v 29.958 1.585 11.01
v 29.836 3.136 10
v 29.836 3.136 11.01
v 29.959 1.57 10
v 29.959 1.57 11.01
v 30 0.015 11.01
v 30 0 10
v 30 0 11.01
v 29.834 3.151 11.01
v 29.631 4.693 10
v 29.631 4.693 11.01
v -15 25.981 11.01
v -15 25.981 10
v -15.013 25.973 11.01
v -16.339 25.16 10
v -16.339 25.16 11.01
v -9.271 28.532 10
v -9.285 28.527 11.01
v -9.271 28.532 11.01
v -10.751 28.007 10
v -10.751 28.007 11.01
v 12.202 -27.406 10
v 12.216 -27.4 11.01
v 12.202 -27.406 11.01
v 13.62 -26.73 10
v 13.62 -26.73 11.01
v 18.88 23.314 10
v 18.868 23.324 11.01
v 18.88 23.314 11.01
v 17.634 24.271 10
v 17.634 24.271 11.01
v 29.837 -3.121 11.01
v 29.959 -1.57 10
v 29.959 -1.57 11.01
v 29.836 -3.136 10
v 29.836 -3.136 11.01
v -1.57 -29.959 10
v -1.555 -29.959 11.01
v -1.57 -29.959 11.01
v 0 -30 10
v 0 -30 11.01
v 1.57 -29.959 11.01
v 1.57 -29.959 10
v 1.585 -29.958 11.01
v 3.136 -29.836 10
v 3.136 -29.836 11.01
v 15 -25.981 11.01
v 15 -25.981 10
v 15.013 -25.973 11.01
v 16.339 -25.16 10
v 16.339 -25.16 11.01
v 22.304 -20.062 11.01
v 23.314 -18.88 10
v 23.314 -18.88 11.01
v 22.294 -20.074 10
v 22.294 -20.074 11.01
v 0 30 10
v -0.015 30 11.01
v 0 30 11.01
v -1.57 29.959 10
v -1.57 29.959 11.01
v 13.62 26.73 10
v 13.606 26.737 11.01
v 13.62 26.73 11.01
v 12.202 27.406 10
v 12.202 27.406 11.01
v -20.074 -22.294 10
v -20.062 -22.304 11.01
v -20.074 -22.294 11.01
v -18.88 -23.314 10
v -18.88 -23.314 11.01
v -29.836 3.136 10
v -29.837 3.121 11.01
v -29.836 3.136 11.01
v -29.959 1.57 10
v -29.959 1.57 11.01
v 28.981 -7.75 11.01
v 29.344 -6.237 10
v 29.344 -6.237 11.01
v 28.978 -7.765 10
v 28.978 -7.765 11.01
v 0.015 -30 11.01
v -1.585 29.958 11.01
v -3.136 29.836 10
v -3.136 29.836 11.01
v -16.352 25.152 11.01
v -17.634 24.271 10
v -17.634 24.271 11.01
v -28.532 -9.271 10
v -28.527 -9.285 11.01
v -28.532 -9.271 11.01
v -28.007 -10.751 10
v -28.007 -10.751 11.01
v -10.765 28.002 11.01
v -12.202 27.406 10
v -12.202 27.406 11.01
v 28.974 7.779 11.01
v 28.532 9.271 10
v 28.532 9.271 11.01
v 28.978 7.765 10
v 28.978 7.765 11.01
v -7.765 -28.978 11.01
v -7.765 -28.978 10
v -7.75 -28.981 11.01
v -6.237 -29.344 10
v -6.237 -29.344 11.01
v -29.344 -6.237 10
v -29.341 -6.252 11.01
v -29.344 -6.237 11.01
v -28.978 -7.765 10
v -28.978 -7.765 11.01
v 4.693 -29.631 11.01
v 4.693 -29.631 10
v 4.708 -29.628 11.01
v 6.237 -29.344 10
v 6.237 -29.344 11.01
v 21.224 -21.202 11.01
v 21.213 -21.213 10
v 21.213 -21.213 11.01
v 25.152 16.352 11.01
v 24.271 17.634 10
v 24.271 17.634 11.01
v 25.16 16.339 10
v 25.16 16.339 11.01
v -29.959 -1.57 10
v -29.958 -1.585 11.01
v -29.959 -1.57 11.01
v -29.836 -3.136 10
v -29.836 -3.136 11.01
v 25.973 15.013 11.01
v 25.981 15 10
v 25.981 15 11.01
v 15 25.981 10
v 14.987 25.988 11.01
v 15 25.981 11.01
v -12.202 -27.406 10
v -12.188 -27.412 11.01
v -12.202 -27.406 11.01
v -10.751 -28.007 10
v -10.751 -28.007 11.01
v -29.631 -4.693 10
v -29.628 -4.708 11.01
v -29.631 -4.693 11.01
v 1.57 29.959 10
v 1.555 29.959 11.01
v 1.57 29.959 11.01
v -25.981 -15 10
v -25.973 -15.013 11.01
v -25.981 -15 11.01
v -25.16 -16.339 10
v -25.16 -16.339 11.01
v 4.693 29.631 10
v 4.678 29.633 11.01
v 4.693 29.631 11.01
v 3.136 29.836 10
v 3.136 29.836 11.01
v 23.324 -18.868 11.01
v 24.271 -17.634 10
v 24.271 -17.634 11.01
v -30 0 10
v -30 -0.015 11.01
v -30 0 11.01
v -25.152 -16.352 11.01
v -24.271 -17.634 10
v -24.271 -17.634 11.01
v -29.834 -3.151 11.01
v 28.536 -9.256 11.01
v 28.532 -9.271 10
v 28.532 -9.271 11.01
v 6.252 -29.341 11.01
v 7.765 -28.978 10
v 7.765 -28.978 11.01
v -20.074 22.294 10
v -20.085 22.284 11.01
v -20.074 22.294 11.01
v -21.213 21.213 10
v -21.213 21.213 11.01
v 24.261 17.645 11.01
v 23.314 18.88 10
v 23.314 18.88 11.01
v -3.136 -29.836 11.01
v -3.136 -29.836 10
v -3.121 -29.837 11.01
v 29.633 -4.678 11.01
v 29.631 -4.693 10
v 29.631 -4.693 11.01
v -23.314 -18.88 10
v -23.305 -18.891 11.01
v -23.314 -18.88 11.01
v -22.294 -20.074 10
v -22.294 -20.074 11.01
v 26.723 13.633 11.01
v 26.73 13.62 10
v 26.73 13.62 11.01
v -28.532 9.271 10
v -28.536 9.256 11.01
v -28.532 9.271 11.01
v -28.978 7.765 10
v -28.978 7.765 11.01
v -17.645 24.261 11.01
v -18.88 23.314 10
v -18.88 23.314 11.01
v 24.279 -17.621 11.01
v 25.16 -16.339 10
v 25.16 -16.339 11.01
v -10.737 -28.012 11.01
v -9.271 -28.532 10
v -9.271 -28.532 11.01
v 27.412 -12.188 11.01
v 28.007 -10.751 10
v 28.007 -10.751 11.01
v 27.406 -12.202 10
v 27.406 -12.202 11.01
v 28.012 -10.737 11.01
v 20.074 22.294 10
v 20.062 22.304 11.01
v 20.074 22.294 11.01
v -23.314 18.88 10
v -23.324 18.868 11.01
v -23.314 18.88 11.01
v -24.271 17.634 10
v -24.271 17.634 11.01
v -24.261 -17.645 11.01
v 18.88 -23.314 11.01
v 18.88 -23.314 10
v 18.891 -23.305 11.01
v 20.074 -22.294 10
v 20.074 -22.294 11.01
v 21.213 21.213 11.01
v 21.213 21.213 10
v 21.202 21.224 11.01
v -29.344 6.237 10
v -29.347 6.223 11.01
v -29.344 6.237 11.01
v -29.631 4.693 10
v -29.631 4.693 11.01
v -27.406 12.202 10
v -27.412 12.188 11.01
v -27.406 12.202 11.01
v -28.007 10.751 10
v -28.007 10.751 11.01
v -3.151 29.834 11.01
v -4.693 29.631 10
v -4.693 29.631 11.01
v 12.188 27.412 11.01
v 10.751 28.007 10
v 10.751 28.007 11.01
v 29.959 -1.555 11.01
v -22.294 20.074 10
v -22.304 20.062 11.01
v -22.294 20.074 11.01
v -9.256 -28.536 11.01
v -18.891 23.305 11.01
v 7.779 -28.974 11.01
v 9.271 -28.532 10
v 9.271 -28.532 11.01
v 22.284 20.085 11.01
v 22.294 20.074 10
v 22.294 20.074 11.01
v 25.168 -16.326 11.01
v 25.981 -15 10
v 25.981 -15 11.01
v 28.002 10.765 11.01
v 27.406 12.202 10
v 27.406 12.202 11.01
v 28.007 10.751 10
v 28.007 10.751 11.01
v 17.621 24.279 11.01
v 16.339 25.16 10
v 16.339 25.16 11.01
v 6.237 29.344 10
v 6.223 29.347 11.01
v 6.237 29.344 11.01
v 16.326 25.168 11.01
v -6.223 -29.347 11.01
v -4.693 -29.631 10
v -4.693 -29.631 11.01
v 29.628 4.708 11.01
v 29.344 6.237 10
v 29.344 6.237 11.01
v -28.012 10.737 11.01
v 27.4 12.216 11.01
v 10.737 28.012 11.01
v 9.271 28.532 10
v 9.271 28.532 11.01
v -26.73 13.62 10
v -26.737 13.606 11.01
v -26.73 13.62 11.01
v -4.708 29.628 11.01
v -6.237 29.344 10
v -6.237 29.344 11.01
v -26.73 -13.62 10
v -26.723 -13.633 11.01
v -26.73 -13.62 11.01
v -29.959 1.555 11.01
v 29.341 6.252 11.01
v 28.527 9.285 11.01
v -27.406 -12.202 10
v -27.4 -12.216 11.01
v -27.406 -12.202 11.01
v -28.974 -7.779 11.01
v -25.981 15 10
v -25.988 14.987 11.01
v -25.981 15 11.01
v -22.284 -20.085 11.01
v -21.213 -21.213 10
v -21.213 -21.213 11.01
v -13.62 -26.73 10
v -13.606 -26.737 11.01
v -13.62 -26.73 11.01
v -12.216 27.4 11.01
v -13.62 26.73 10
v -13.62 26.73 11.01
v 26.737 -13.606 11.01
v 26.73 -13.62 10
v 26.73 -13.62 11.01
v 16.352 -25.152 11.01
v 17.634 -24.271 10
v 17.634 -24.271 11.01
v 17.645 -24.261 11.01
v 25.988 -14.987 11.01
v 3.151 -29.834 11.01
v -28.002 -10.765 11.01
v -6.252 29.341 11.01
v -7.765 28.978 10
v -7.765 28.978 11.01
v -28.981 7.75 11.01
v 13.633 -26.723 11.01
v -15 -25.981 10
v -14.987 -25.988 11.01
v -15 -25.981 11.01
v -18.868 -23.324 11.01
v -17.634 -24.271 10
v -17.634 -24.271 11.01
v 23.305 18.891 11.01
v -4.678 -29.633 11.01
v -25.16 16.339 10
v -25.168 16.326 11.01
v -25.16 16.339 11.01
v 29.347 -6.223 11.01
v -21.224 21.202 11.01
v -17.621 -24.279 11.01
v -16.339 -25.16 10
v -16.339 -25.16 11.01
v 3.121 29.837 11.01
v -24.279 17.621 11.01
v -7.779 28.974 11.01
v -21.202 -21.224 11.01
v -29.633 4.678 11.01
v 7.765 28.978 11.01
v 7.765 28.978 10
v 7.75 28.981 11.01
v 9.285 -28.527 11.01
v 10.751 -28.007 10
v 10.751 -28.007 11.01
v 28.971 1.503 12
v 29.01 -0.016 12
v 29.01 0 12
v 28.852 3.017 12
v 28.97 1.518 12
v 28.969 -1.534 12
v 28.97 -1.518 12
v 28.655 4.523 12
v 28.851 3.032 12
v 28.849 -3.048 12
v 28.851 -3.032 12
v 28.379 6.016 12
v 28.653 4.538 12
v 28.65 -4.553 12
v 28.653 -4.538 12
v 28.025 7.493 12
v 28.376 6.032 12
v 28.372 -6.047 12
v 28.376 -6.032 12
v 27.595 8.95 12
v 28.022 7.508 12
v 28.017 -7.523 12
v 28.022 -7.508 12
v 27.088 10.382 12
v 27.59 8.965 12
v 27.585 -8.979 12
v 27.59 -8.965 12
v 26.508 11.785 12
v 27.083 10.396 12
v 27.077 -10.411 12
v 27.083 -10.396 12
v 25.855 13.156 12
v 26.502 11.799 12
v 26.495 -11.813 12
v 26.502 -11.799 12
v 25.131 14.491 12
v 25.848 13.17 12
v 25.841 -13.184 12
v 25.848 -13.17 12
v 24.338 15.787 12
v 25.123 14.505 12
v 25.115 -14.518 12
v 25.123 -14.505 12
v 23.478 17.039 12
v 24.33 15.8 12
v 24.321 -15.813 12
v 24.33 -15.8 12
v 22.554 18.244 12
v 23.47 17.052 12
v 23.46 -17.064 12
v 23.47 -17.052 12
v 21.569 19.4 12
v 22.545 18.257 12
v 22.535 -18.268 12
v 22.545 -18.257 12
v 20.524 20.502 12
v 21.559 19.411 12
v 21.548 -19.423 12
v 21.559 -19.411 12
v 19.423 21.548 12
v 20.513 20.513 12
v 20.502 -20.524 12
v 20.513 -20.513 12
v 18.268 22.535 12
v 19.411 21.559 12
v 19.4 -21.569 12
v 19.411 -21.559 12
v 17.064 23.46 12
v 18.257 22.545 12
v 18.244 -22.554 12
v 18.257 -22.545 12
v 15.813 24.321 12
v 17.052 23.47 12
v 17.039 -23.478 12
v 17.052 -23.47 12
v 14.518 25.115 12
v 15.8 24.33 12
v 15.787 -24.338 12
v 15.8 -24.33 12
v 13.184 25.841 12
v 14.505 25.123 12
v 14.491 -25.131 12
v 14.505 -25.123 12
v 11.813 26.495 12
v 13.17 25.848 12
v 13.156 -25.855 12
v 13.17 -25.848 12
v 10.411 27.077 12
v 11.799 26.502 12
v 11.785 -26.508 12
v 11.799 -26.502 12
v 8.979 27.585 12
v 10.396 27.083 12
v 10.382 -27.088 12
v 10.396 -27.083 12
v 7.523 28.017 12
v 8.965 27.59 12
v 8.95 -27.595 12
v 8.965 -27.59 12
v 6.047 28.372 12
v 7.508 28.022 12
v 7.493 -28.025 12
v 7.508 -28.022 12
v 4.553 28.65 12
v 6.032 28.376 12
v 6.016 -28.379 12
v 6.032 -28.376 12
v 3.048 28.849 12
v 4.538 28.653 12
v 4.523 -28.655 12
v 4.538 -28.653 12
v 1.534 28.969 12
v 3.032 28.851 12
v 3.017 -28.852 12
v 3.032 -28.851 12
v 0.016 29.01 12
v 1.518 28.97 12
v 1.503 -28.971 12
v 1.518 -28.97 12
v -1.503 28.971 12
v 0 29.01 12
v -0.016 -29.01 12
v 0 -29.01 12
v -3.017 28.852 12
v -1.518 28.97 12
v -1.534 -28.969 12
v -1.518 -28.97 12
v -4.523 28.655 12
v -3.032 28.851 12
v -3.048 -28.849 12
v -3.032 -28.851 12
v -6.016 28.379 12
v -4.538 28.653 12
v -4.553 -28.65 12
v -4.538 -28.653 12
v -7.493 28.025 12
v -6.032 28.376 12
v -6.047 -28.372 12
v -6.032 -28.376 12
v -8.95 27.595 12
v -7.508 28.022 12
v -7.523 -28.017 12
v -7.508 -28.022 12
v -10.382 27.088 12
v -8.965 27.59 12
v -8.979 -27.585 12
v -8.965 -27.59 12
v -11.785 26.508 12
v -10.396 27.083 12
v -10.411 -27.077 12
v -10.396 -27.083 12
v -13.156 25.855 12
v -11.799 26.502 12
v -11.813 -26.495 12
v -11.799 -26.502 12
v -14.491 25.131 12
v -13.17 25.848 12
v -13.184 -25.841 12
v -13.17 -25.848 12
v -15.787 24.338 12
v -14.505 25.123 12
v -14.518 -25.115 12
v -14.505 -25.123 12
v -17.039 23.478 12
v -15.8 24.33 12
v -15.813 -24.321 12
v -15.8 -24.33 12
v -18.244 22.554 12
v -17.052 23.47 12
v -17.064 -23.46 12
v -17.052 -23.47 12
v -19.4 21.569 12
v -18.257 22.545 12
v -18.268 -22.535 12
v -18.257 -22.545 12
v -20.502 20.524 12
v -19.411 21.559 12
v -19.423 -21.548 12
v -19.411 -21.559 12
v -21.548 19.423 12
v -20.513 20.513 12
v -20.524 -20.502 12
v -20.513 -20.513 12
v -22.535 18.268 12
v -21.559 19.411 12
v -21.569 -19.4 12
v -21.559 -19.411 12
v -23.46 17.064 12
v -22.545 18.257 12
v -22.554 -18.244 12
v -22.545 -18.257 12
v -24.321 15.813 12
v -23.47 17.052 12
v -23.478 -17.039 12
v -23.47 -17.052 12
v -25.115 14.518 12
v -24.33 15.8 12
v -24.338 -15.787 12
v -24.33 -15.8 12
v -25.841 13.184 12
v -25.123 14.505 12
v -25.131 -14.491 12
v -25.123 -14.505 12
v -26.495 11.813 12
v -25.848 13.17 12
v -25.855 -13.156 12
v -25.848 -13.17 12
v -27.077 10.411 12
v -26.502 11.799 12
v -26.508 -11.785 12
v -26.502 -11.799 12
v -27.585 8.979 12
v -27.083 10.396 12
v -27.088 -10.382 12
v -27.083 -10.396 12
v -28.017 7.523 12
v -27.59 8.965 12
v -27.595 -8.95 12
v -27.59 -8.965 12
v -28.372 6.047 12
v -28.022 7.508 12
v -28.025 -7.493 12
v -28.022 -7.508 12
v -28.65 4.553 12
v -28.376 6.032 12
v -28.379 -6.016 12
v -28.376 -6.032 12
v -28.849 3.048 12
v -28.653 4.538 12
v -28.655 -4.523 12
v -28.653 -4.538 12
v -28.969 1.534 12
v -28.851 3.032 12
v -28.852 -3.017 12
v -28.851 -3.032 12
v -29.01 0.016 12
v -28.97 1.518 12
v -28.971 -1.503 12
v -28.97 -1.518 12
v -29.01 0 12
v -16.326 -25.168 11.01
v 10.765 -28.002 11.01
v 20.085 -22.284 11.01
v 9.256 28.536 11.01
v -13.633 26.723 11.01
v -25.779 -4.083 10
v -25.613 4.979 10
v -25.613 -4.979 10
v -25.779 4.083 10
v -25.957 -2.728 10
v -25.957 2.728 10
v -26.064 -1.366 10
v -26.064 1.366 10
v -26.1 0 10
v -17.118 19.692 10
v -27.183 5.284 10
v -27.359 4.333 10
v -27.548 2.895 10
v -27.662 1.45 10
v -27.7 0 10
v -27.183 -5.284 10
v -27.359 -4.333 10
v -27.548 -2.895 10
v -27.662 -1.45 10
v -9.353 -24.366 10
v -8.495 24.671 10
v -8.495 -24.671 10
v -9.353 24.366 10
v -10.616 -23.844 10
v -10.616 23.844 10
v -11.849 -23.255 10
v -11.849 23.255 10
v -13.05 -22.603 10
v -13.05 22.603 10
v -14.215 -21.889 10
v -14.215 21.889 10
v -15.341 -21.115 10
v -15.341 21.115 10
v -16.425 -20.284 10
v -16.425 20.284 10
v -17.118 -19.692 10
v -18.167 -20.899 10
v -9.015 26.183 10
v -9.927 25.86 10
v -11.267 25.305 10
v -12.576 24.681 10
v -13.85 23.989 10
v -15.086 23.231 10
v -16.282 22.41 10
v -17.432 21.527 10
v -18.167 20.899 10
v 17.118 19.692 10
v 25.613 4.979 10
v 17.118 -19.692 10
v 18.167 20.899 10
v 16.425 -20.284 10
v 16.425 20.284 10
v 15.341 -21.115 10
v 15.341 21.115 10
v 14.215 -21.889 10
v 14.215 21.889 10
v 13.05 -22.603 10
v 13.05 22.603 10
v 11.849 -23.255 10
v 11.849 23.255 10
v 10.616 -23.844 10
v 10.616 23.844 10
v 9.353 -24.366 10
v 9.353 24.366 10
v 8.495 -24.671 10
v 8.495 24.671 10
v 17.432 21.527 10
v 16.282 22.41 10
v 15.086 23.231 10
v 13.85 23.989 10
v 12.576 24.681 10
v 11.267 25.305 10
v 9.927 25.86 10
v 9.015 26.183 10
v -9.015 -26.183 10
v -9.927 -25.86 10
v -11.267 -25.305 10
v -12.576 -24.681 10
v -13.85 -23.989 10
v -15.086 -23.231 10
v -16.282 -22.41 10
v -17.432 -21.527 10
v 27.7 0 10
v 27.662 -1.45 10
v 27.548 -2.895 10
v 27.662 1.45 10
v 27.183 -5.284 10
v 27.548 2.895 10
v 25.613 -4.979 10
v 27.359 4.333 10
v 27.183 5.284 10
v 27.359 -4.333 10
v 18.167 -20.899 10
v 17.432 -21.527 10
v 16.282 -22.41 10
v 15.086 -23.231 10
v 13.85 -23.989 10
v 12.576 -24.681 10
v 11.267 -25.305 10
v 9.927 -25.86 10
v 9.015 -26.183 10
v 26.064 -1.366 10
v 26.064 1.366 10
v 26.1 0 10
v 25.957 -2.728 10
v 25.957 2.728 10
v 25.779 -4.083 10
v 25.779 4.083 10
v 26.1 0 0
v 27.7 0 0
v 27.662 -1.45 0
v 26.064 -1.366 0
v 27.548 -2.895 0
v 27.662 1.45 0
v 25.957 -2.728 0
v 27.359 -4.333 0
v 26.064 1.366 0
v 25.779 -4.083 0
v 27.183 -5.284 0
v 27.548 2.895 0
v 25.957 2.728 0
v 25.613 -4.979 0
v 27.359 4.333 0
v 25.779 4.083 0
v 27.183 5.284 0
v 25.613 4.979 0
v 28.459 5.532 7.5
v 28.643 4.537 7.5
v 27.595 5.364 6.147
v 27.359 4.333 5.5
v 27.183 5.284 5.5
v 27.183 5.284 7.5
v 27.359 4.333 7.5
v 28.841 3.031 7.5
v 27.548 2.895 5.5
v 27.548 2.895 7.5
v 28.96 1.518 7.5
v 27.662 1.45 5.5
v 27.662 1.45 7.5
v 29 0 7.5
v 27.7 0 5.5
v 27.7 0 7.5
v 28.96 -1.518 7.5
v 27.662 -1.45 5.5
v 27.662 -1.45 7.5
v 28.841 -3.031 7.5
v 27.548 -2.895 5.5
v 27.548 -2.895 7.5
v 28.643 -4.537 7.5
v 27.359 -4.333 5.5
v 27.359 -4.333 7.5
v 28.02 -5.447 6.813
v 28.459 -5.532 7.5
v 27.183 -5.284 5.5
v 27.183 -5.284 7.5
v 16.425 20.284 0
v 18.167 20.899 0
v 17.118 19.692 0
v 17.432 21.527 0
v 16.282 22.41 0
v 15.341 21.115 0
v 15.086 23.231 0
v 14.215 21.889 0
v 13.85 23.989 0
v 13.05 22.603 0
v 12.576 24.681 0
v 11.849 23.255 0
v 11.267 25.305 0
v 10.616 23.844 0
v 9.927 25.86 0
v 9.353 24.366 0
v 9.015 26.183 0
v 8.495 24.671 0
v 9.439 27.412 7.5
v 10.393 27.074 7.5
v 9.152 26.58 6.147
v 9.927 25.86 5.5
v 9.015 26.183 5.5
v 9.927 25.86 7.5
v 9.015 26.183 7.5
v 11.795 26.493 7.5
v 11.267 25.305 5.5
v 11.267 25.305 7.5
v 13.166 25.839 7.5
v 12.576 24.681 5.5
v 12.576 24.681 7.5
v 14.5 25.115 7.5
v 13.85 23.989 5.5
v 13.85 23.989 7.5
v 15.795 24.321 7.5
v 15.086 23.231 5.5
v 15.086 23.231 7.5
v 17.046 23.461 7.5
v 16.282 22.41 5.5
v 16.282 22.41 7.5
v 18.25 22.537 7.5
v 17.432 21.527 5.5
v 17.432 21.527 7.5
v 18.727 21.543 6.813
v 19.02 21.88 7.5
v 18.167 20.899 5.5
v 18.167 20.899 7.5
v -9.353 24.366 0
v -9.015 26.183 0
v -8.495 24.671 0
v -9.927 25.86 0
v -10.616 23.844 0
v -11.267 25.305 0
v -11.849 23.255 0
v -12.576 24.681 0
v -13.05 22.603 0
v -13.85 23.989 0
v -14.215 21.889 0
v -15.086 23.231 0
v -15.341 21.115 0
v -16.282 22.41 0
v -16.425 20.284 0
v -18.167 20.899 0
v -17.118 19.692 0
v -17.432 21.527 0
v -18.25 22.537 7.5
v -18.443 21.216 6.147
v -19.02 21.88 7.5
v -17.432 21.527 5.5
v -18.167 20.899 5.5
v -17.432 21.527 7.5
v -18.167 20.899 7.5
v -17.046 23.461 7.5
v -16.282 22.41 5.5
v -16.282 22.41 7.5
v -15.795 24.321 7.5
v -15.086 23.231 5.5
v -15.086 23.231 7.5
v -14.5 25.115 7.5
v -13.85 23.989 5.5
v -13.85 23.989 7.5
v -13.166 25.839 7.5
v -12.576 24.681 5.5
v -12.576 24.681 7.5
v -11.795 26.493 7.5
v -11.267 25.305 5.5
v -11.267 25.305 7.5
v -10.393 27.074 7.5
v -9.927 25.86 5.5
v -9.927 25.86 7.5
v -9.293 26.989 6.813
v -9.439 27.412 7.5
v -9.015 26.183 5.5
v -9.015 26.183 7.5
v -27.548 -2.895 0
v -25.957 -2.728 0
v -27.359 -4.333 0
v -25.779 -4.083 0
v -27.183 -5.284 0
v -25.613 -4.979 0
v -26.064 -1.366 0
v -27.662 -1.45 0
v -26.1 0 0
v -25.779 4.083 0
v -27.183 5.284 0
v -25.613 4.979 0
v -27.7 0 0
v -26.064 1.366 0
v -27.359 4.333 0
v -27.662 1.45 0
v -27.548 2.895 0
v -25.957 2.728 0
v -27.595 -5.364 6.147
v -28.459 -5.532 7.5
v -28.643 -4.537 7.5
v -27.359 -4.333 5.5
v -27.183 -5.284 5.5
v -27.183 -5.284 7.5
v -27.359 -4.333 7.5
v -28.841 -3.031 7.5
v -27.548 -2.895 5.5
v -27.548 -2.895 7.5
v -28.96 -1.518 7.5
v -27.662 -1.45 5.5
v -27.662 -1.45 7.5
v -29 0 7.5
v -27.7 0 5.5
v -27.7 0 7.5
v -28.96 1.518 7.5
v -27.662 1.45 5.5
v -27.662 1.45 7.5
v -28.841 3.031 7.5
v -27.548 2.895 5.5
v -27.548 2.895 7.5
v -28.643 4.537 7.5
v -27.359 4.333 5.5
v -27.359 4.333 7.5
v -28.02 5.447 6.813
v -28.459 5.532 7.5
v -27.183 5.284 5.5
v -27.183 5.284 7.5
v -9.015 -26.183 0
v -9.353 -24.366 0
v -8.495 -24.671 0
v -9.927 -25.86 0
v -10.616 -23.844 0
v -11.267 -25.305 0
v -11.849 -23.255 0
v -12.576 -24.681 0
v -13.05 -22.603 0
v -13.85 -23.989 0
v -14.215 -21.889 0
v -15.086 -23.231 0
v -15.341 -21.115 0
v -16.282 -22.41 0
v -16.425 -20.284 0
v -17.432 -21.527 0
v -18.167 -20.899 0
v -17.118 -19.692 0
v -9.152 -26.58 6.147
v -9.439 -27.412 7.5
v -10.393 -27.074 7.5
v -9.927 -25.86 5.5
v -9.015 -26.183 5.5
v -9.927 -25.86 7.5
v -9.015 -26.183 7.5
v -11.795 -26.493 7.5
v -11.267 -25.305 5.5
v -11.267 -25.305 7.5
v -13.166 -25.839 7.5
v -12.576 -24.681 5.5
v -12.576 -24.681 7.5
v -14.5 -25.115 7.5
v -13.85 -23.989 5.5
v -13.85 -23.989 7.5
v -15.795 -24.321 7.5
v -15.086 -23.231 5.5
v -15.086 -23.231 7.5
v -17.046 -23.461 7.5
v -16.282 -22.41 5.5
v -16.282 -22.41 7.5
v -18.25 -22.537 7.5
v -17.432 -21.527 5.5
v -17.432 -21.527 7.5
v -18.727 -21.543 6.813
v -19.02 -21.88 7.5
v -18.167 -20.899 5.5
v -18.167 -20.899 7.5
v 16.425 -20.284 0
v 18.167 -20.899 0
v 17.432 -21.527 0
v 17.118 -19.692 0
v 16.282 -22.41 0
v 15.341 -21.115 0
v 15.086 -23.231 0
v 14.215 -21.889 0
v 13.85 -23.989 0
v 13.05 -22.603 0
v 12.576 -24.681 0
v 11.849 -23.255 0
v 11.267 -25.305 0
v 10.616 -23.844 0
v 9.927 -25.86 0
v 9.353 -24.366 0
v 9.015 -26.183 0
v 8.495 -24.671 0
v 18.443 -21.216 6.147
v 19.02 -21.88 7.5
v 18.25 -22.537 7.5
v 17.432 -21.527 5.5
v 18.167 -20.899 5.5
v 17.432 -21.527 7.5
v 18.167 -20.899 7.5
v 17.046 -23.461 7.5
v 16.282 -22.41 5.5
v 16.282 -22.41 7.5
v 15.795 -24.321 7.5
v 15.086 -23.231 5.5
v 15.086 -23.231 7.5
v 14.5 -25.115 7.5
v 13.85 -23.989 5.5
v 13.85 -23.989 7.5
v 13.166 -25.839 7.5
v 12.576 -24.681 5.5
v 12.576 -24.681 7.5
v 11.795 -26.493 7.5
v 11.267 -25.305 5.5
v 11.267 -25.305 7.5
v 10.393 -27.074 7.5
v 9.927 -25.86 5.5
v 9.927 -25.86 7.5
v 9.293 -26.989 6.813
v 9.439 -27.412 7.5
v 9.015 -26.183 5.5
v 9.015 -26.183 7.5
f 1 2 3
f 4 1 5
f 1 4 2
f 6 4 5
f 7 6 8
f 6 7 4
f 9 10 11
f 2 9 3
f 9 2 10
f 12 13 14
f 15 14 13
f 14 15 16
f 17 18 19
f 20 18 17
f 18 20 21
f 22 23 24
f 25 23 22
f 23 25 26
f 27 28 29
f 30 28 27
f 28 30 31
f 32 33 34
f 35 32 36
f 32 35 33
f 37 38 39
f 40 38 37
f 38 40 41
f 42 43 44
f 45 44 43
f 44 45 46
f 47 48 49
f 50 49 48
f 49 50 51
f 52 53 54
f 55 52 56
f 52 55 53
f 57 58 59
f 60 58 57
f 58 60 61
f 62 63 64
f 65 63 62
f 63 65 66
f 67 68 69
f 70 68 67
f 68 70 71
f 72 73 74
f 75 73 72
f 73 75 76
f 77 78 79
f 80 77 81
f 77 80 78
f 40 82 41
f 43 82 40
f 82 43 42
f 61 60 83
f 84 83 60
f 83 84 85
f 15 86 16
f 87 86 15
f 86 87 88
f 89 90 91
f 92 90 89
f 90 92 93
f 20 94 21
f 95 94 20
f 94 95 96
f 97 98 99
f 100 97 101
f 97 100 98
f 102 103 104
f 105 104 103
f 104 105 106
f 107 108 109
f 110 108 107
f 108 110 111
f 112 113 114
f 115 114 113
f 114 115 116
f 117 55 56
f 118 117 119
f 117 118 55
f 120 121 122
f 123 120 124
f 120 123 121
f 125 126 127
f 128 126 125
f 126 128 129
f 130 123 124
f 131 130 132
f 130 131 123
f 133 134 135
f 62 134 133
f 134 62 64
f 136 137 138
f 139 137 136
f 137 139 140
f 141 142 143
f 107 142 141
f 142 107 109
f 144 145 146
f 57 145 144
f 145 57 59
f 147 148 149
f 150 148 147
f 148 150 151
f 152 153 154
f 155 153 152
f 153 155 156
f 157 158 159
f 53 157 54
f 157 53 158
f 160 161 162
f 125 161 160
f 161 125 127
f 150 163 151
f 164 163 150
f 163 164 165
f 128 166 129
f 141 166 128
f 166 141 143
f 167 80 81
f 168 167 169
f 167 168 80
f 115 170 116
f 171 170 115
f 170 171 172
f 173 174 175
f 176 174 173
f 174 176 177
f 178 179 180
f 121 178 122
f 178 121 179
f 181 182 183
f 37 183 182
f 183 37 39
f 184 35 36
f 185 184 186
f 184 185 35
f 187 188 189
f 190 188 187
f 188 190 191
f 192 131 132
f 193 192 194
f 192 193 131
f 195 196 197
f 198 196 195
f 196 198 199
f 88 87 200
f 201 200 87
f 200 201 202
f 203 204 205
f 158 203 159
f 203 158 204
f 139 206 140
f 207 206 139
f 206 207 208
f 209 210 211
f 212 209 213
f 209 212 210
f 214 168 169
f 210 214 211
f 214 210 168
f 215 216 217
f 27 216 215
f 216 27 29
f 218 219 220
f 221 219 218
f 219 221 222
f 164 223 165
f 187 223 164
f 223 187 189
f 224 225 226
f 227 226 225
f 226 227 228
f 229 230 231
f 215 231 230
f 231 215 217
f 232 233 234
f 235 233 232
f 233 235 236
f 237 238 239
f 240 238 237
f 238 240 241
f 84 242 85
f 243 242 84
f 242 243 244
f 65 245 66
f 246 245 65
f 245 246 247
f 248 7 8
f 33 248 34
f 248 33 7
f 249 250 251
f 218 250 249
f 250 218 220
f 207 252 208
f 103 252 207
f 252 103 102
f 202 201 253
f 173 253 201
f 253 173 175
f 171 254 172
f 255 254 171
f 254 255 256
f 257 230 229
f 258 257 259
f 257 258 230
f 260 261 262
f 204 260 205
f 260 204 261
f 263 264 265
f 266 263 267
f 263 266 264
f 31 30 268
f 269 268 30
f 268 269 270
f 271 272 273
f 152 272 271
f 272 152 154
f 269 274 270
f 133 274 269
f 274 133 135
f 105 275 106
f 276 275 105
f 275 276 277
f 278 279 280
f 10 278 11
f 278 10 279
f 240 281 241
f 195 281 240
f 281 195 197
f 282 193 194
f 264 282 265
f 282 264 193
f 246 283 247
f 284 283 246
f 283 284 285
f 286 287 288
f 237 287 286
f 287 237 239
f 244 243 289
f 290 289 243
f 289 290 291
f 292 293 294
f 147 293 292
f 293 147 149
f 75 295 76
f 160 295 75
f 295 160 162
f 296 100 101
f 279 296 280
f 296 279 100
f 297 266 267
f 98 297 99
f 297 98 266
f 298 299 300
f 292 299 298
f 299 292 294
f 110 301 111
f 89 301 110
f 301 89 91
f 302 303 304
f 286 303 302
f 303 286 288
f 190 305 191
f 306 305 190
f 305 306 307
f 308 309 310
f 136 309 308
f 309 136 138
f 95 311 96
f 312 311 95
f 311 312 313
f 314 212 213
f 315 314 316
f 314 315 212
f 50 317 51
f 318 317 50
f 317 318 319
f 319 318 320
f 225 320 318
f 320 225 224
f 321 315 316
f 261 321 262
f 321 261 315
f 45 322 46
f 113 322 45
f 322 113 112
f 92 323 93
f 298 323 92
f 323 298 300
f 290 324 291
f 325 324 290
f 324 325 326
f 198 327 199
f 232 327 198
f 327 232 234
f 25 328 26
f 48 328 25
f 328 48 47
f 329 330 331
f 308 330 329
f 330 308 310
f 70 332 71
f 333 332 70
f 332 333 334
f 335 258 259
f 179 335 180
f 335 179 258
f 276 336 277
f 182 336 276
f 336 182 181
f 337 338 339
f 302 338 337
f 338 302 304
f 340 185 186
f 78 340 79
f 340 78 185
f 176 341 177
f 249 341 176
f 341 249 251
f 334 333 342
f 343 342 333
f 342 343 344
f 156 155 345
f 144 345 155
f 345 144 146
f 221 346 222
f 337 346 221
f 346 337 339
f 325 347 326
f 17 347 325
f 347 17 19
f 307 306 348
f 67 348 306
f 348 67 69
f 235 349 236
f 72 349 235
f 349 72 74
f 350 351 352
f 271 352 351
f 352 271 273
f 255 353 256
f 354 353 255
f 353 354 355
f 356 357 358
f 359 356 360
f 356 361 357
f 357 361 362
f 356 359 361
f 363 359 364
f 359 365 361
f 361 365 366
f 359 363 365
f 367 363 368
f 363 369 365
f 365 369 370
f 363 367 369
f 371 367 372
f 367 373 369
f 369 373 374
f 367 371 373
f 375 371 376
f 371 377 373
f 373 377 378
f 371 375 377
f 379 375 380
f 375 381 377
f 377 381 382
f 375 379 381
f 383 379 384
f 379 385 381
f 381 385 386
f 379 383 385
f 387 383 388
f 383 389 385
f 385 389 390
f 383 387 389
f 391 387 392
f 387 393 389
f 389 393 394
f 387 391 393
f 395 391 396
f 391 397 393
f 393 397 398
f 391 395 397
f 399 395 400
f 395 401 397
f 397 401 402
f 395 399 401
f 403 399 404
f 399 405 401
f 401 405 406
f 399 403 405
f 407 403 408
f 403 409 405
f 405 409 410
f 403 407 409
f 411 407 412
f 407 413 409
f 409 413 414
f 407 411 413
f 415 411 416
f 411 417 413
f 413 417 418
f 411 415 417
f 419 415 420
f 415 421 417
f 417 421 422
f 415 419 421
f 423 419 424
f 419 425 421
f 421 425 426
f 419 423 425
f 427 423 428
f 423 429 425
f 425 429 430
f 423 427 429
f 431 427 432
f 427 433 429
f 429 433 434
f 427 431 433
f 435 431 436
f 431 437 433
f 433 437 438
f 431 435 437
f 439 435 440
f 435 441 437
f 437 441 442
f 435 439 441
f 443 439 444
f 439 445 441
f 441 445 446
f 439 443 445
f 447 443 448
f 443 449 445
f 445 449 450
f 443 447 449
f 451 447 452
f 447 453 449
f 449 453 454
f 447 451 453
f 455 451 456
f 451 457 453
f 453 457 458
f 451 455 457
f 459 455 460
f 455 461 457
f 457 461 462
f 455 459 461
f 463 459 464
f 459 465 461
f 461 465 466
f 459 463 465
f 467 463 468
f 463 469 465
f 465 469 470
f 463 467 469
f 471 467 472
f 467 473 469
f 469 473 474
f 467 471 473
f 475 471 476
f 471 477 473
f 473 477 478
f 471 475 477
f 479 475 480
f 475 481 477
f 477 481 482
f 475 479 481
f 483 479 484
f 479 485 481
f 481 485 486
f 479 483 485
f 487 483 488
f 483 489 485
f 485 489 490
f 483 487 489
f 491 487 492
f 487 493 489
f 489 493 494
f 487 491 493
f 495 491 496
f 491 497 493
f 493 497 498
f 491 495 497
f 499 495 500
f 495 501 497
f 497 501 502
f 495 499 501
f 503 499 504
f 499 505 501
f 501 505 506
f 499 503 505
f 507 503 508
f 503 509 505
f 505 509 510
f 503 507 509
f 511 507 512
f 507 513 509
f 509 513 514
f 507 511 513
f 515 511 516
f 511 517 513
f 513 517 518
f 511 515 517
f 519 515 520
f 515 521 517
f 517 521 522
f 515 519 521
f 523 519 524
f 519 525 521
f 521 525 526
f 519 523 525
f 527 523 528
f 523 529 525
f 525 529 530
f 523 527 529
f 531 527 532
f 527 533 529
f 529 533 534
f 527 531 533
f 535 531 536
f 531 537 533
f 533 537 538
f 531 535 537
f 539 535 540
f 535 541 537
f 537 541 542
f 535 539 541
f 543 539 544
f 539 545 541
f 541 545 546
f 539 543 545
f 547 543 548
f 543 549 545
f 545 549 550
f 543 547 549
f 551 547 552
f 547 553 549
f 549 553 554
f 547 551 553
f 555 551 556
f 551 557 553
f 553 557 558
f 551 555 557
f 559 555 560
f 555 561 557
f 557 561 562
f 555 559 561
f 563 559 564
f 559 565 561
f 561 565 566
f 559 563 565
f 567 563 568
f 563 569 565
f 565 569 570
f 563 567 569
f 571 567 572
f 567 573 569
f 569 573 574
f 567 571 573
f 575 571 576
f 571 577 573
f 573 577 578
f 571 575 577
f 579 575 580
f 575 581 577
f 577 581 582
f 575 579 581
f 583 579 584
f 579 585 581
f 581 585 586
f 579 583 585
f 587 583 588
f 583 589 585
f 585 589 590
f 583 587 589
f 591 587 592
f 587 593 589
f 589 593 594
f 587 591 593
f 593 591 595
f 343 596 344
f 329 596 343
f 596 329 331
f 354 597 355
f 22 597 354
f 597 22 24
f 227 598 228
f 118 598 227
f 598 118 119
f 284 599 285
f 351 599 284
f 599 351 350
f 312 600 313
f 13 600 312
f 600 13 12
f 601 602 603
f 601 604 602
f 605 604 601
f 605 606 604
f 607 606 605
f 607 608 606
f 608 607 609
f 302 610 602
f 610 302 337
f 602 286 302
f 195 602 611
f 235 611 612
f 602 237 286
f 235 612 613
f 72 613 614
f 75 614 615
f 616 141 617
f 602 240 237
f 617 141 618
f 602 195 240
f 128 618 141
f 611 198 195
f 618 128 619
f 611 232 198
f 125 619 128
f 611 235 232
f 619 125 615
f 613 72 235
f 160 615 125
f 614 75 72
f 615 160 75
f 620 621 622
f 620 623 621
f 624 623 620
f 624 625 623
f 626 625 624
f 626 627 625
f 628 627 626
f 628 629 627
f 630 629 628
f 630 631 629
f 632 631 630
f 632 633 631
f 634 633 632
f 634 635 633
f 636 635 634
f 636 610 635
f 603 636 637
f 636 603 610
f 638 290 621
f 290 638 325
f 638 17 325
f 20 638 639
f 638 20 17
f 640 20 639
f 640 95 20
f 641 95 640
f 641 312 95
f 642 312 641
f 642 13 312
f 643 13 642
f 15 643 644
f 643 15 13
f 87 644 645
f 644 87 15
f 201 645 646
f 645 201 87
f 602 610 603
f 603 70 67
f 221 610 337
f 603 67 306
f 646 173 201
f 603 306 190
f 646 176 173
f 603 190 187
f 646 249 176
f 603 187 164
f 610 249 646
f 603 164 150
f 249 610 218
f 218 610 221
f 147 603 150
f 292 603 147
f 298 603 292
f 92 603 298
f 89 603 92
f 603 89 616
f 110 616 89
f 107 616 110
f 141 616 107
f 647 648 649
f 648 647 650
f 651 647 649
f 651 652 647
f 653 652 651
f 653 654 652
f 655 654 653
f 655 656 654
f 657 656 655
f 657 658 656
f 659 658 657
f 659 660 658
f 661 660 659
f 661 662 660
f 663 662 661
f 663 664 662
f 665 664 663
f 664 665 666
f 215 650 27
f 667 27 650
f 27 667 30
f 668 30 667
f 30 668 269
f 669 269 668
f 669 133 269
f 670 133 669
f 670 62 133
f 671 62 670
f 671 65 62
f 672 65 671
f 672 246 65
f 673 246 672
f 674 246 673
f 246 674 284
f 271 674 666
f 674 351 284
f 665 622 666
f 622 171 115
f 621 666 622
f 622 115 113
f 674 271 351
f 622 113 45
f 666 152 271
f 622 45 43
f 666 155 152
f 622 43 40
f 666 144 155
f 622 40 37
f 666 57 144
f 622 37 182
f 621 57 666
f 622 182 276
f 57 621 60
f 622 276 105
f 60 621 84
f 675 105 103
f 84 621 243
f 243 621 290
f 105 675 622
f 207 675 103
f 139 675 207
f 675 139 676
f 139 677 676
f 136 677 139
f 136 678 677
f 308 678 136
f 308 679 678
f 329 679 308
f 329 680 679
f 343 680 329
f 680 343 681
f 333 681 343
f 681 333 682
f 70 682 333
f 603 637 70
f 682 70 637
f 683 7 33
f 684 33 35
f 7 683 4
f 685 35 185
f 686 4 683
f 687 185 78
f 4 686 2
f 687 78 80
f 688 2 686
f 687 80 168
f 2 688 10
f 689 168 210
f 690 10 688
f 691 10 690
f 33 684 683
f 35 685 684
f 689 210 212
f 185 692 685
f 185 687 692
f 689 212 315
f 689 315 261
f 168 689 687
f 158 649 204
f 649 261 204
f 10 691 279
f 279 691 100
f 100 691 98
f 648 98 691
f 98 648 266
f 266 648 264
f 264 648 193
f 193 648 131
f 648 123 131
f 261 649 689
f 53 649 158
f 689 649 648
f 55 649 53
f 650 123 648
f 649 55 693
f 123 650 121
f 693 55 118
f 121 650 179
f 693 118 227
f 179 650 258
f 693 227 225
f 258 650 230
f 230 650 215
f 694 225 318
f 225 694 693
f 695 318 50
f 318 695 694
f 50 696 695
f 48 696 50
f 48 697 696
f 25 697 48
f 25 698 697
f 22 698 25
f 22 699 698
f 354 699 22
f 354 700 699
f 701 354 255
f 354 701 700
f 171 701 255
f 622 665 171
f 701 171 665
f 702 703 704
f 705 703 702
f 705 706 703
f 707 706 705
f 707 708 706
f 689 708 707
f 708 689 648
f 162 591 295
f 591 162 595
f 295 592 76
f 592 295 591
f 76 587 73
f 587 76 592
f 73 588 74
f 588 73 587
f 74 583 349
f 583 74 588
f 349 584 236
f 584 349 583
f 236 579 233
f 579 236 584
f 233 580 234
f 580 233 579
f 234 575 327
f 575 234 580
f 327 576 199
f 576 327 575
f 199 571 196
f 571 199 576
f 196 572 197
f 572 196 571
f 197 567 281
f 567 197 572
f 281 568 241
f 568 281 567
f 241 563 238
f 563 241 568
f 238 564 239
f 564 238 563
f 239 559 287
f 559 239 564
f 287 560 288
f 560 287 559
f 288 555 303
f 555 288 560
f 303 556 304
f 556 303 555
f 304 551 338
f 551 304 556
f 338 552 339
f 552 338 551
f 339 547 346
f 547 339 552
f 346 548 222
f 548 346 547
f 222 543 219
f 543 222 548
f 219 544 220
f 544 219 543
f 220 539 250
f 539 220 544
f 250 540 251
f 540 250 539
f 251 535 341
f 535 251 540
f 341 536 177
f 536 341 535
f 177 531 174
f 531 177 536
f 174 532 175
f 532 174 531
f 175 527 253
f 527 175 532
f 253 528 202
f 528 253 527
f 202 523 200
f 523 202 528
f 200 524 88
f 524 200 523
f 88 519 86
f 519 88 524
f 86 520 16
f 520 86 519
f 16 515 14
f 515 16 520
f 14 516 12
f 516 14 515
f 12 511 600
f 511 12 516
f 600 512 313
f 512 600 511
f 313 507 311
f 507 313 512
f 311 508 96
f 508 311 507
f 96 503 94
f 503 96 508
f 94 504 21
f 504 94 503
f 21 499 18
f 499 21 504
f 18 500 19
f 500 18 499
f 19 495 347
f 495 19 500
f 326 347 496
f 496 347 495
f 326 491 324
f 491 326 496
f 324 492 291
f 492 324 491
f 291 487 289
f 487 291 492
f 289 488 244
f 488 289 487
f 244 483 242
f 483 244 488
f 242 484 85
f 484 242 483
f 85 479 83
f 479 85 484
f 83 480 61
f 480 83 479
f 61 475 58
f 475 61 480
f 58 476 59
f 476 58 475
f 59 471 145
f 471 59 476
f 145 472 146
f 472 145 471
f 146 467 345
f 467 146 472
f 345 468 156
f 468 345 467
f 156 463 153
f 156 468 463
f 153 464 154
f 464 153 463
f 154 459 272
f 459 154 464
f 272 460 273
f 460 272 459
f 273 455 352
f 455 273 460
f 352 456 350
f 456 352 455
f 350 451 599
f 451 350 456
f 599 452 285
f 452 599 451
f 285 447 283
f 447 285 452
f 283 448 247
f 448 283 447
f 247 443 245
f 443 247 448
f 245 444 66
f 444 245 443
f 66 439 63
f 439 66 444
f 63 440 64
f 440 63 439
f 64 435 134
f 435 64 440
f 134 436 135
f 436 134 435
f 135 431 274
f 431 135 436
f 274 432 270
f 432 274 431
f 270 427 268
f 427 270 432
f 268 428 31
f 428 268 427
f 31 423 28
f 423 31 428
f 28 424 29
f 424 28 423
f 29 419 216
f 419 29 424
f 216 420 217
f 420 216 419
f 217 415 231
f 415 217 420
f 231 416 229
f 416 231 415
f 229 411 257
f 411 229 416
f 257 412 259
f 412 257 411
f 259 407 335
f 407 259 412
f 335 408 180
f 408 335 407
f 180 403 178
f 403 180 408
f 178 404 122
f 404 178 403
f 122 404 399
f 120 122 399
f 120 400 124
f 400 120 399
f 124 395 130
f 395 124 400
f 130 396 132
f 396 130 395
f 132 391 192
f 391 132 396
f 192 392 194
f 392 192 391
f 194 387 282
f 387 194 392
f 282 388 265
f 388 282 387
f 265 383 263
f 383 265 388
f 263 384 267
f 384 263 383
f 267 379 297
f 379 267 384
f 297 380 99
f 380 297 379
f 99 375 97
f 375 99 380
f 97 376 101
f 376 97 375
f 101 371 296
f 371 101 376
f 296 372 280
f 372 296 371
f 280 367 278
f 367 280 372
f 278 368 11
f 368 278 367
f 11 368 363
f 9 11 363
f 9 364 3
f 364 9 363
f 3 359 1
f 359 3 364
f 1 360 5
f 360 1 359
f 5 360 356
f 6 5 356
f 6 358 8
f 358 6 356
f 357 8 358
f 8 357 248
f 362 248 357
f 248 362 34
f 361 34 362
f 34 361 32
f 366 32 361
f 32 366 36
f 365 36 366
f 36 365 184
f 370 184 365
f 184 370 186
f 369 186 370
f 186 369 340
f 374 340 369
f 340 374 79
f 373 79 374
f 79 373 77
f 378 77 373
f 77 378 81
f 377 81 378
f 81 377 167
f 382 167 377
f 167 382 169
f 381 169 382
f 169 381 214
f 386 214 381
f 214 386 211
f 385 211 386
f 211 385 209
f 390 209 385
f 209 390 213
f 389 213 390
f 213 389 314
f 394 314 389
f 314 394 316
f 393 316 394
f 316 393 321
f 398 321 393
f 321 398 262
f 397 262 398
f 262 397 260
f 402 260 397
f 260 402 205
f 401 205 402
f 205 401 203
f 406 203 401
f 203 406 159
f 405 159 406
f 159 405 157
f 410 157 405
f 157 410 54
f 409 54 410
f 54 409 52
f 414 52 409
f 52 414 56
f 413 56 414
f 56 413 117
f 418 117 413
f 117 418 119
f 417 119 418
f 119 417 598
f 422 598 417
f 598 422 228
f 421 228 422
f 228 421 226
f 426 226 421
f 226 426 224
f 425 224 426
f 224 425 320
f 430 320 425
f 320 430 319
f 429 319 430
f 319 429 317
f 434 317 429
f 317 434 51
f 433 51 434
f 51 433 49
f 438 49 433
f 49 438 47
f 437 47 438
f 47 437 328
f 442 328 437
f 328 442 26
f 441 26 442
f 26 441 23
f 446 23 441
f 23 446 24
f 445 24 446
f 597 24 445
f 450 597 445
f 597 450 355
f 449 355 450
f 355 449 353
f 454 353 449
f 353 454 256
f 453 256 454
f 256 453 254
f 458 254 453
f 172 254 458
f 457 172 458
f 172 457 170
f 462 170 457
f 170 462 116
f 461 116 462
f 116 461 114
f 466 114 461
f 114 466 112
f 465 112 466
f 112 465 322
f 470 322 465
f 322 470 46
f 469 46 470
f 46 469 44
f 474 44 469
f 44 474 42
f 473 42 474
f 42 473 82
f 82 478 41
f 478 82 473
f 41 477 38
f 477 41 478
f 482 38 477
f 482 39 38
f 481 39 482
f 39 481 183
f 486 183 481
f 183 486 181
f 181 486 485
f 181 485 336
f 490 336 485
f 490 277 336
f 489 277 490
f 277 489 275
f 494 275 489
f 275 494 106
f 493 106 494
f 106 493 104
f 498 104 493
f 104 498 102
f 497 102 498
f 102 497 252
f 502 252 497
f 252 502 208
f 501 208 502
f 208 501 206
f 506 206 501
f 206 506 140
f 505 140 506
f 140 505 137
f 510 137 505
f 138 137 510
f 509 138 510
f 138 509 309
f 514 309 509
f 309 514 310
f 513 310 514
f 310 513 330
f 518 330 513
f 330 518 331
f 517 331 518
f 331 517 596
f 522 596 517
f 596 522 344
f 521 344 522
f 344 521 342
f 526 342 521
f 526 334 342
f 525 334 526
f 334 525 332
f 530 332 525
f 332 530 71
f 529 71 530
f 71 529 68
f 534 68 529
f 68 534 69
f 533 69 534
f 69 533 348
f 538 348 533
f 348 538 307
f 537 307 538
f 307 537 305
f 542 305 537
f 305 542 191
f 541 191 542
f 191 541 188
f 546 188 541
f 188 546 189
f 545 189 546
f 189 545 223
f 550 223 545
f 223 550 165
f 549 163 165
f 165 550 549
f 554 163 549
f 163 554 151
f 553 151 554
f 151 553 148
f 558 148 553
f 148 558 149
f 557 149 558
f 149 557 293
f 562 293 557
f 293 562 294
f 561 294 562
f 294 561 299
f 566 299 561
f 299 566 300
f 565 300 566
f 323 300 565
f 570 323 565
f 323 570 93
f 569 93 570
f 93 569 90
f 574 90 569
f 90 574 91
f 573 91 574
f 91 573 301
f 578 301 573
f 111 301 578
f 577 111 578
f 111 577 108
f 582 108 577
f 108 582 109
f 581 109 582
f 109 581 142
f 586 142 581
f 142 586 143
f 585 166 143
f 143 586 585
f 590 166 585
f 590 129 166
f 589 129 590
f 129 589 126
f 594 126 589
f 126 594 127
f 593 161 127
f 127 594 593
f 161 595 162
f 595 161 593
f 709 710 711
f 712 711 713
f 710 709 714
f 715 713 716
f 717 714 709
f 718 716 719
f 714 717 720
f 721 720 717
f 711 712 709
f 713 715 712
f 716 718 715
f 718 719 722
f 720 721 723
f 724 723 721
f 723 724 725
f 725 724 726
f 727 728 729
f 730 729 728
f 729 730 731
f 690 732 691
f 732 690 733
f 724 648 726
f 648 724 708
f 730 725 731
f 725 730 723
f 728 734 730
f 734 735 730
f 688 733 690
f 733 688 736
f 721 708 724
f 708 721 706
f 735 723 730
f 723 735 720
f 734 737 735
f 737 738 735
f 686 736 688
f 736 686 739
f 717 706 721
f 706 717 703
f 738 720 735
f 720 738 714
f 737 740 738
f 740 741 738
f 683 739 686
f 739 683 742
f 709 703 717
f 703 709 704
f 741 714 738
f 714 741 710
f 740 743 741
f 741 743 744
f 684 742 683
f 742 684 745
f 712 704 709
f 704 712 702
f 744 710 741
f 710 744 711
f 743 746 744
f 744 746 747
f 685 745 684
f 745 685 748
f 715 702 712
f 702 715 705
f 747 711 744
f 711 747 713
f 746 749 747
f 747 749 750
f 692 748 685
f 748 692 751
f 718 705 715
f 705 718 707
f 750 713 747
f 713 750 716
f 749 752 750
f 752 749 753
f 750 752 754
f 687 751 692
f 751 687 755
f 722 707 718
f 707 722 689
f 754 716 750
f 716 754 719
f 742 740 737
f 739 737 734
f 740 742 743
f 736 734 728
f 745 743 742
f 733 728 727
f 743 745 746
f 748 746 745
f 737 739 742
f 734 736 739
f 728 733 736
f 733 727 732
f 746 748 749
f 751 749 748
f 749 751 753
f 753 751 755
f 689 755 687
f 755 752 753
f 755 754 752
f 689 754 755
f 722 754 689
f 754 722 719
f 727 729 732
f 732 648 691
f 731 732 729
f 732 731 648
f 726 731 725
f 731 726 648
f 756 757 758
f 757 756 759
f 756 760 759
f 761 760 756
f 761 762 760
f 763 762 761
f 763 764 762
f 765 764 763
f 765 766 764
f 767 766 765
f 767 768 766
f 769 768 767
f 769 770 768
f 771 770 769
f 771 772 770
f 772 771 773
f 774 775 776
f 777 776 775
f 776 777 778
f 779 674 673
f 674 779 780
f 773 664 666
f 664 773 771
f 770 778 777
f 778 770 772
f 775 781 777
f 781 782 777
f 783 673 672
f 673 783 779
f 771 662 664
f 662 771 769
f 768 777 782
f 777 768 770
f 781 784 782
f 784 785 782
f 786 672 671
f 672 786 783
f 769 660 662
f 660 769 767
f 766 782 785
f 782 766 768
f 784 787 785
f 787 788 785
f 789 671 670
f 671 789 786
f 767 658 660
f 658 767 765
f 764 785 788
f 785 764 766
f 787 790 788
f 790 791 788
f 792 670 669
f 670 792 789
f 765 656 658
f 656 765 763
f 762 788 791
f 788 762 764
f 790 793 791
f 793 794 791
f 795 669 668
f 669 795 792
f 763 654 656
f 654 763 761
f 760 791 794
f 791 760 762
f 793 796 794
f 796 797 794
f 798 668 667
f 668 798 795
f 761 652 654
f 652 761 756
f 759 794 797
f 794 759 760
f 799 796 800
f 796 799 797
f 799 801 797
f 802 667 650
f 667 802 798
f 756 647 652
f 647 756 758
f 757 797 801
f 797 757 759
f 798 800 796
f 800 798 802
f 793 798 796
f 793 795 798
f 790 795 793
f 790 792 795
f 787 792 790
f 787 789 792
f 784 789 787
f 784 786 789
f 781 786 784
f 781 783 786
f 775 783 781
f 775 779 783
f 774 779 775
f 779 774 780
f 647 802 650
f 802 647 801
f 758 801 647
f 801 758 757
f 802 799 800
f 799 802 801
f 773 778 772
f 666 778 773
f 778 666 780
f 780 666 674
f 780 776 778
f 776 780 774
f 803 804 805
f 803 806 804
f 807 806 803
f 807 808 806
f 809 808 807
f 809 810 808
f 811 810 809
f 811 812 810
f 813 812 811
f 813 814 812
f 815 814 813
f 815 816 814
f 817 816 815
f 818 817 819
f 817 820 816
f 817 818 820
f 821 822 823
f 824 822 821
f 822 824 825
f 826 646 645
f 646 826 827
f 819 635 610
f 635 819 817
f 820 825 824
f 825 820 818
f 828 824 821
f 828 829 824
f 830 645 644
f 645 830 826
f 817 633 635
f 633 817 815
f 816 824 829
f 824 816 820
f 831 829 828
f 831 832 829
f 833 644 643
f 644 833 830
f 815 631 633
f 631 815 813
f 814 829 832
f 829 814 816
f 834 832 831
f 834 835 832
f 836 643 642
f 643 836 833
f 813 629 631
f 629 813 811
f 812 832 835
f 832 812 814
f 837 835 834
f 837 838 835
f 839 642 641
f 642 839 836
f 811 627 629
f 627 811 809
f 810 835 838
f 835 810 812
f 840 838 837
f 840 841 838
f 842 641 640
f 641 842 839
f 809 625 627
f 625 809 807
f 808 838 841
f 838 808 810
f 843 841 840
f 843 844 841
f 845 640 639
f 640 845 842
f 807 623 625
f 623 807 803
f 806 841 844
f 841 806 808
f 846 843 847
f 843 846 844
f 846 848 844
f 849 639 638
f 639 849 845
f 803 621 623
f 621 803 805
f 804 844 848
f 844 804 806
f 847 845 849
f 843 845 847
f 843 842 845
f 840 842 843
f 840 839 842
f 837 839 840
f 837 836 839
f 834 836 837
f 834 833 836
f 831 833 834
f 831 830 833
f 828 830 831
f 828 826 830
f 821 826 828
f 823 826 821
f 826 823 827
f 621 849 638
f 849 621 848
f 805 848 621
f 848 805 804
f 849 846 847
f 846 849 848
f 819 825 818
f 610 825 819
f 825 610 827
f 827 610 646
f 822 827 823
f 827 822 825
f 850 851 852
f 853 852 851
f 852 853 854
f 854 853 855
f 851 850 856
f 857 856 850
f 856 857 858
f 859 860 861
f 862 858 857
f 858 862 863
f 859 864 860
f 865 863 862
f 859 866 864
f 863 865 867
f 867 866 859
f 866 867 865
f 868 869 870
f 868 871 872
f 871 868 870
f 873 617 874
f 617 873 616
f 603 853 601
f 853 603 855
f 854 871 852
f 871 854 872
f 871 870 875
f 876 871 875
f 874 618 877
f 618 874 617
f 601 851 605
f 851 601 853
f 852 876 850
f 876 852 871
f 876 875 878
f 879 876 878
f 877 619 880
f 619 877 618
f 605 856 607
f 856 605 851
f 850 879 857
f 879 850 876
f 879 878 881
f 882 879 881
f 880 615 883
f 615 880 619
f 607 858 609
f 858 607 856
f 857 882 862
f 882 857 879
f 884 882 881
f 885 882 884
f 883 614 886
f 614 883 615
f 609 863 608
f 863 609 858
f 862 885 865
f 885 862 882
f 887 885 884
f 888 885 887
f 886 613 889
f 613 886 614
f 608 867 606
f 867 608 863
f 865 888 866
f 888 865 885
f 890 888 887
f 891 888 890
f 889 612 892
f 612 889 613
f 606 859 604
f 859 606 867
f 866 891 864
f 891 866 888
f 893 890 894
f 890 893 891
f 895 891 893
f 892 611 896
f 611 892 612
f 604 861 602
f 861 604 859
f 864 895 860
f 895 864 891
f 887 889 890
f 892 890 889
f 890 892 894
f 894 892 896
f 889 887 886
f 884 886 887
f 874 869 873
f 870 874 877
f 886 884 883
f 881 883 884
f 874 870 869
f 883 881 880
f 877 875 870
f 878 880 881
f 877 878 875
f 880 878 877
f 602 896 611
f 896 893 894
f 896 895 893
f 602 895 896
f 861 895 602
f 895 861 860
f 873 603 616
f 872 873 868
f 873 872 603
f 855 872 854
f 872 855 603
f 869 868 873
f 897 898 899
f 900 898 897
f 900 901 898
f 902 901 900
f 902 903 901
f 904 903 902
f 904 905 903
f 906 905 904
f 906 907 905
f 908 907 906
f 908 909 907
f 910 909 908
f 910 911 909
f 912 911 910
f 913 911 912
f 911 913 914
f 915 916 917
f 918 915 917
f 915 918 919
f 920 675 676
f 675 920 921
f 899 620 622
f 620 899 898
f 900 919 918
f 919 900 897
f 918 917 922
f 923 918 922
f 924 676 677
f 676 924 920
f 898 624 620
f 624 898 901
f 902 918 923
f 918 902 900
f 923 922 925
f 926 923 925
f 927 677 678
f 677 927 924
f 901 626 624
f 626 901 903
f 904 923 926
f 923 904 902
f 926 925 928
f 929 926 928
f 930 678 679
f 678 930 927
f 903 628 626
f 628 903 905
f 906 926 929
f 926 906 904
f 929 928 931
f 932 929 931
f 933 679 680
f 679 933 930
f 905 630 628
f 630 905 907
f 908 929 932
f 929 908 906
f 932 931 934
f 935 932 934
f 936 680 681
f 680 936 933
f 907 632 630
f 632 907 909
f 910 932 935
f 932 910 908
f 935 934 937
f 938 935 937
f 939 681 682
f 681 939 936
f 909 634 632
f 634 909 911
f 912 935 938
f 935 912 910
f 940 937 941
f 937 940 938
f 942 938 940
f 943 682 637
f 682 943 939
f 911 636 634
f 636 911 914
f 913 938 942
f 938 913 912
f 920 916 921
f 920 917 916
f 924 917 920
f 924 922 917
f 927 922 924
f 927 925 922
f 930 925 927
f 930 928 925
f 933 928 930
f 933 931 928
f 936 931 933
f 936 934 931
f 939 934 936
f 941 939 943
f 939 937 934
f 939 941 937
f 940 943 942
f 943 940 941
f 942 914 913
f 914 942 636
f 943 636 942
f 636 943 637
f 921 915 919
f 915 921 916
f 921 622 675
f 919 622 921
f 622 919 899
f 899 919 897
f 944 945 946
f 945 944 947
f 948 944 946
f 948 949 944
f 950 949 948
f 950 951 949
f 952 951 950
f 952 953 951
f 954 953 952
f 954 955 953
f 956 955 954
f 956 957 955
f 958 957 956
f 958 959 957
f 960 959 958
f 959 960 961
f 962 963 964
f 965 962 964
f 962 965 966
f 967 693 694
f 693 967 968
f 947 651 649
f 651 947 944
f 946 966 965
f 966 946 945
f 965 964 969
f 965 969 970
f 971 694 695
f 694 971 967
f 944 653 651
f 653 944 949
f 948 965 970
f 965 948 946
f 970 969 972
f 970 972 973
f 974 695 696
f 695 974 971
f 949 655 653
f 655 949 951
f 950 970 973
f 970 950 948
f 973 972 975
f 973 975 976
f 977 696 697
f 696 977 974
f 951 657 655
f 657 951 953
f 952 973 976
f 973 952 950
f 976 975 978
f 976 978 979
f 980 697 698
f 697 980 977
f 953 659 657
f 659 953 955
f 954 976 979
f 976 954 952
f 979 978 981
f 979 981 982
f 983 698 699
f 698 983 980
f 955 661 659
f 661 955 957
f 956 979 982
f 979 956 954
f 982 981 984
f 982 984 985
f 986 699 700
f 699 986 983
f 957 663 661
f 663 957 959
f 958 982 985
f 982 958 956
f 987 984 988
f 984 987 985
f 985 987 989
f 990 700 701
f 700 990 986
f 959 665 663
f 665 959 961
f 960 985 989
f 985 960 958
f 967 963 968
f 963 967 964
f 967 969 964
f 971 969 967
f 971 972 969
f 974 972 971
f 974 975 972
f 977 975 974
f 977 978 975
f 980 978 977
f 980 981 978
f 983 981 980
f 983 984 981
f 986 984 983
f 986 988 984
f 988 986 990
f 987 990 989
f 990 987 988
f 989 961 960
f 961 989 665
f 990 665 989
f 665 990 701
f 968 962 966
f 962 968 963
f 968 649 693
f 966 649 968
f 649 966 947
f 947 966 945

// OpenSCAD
// ============================================================
//  NABENDECKEL / HUB-CAP GENERATOR
//  Parametrischer Nabendeckel mit Schnappnasen (Clip-Fit)
//  und optionalem Logo (eigenes SVG oder Text).
//
//  Kompatibel mit dem MakerWorld-Customizer und OpenSCAD Desktop.
//  Einheit: Millimeter (mm)
// ============================================================


/* [Grundmaße] */
// Außendurchmesser der sichtbaren Deckel-Oberseite (der Rand/die Blende, die auf dem Rad aufliegt)
outer_diameter = 60;      // [20:0.5:220]
// Montage-/Bohrungsdurchmesser: der Durchmesser, mit dem der Deckel in die Radöffnung greift (dort sitzen die Clips)
mount_diameter = 56;      // [15:0.5:210]
// Gesamthöhe / Einstecktiefe des Deckels
total_height = 12;        // [5:0.5:60]
// Dicke der Deckel-Oberseite (Deckplatte)
face_thickness = 2.0;     // [0.8:0.2:6]

/* [Rand / Optik] */
// Fase (Abschrägung) an der oberen Außenkante – 0 = scharfe Kante
top_chamfer = 1.0;        // [0:0.2:8]
// Erhabener Zierring am äußeren Rand der Oberseite (0 = aus)
rim_ring_height = 0;      // [0:0.2:4]
// Breite des Zierrings
rim_ring_width = 3;       // [1:0.5:15]

/* [Schnappnasen / Clips] */
// Anzahl der Clips rund herum
clip_count = 6;           // [2:1:16]
// Wandstärke eines Clip-Fingers (radial)
clip_thickness = 1.6;     // [0.8:0.1:4]
// Winkelbreite eines Clips in Grad (muss kleiner als 360/Anzahl sein)
clip_width_deg = 22;      // [4:1:60]
// Höhe der Rastnase (wie weit sie radial nach außen steht und damit greift)
barb_depth = 1.0;         // [0.2:0.1:4]
// Länge der Einführschräge der Rastnase (größer = leichter einzudrücken)
barb_ramp = 2.0;          // [0.5:0.1:8]
// Klemmdicke: Materialstärke des Rades zwischen Auflage-Rand und Rastkante
grip_thickness = 2.5;     // [0.5:0.1:12]
// Spiel/Toleranz zwischen Clip-Außenseite und Bohrung (Druckertoleranz)
tolerance = 0.3;          // [0:0.05:1.5]

/* [Logo] */
// Logo-Quelle
logo_mode = "none";       // [none:Kein Logo, svg:SVG-Datei, text:Text]
// Pfad zur SVG-Datei (im selben Ordner ablegen). SVG möglichst mittig exportieren.
logo_file = "logos/logo.svg";
// Zieldurchmesser/-breite des Logos auf dem Deckel
logo_size = 30;           // [5:0.5:200]
// Höhe des Logos: positiv = erhaben, negativ = graviert/vertieft
logo_height = 0.8;        // [-4:0.1:4]
// Vertiefte Kreisfläche unter dem Logo (0 = keine). Gibt dem Logo einen sauberen "Teller".
logo_recess_depth = 0;    // [0:0.1:3]
// Durchmesser der vertieften Kreisfläche
logo_recess_diameter = 36; // [5:0.5:200]
// Feinjustierung der Logo-Position (falls SVG nicht ganz zentriert ist)
logo_offset_x = 0;        // [-30:0.1:30]
logo_offset_y = 0;        // [-30:0.1:30]
// Logo drehen (Grad)
logo_rotation = 0;        // [0:1:360]

/* [Text-Logo] */
// Text (nur wenn Logo-Quelle = text)
logo_text = "LOGO";
// Schriftart
logo_font = "Liberation Sans:style=Bold";

/* [Qualität] */
// Auflösung der Rundungen (höher = glatter, aber langsamer)
resolution = 120;         // [40:10:360]


// ============================================================
//  ABGELEITETE WERTE  (nicht im Customizer sichtbar)
// ============================================================
module __END_OF_CUSTOMIZER__() {}  // Marker: alles darunter ist interne Logik

eps = 0.01;
$fn = resolution;

top_r     = outer_diameter / 2;              // Radius der Oberseite/Blende
skirt_r   = mount_diameter / 2 - tolerance;  // Außenradius der Clip-Schürze
inner_r   = max(1, skirt_r - clip_thickness);// Innenradius der Clips
barb_tip_r = mount_diameter / 2 + barb_depth;// wie weit die Rastnase greift

skirt_height = total_height - face_thickness; // Länge der Clips (unter der Deckplatte)
ledge_z  = max(barb_ramp + 0.2, skirt_height - grip_thickness); // z der Rastkante (flacher Fang)
ramp_z   = ledge_z - barb_ramp;               // Start der Einführschräge

pitch    = 360 / clip_count;
clip_w   = min(clip_width_deg, pitch - 2);    // Sicherheit: Clip schmaler als Teilung


// ============================================================
//  BAUTEILE
// ============================================================

// -- Profil eines Clip-Rings (wird später in Segmente geschnitten) --
module clip_ring_profile() {
    rotate_extrude(angle = 360)
        polygon(points = [
            [inner_r, 0],
            [skirt_r, 0],
            [skirt_r, ramp_z],
            [barb_tip_r, ledge_z],   // Einführschräge hoch nach außen
            [skirt_r, ledge_z],      // flache Rastkante (hält gegen Herausziehen)
            [skirt_r, skirt_height + eps],
            [inner_r, skirt_height + eps]
        ]);
}

// -- Ein Winkelsegment als Schneidwerkzeug --
module wedge(angle) {
    rotate_extrude(angle = angle)
        square([barb_tip_r + 2, skirt_height + face_thickness + 2]);
}

// -- Alle Clips rund herum --
module clips() {
    for (i = [0 : clip_count - 1]) {
        rotate([0, 0, i * pitch])
            intersection() {
                clip_ring_profile();
                rotate([0, 0, -clip_w / 2]) wedge(clip_w);
            }
    }
}

// -- Deckplatte (Oberseite) --
module face_plate() {
    difference() {
        // Grundplatte
        translate([0, 0, skirt_height])
            cylinder(h = face_thickness, r = top_r);

        // Obere Außenkante fasen
        if (top_chamfer > 0) {
            rotate_extrude()
                polygon(points = [
                    [top_r - top_chamfer, total_height + eps],
                    [top_r + eps,         total_height + eps],
                    [top_r + eps,         total_height - top_chamfer]
                ]);
        }

        // Vertiefte Kreisfläche für das Logo
        if (logo_recess_depth > 0) {
            translate([0, 0, total_height - logo_recess_depth + eps])
                cylinder(h = logo_recess_depth, d = logo_recess_diameter);
        }
    }
}

// -- Optionaler erhabener Zierring am Rand --
module rim_ring() {
    if (rim_ring_height > 0) {
        translate([0, 0, total_height - eps])
            difference() {
                cylinder(h = rim_ring_height, r = top_r);
                translate([0, 0, -eps])
                    cylinder(h = rim_ring_height + 2 * eps, r = top_r - rim_ring_width);
            }
    }
}

// -- Logo als 2D-Form (SVG oder Text), zentriert --
module logo_2d() {
    if (logo_mode == "svg") {
        // resize skaliert das SVG proportional auf die Zielbreite
        resize([logo_size, 0, 0], auto = true)
            import(logo_file, center = true);
    } else if (logo_mode == "text") {
        text(logo_text, size = logo_size / 2,
             halign = "center", valign = "center", font = logo_font);
    }
}

// -- Logo platziert (erhaben oder graviert) --
module logo_3d() {
    if (logo_mode != "none" && logo_height != 0) {
        // Oberfläche, auf der das Logo sitzt (Boden der Vertiefung, falls vorhanden)
        surface_z = total_height - (logo_recess_depth > 0 ? logo_recess_depth : 0);
        h = abs(logo_height);
        // erhaben: von der Oberfläche nach oben; graviert: von der Oberfläche nach unten
        base_z = (logo_height > 0) ? surface_z : surface_z - h;

        translate([logo_offset_x, logo_offset_y, base_z - eps])
            rotate([0, 0, logo_rotation])
                linear_extrude(height = h + eps)
                    logo_2d();
    }
}


// ============================================================
//  ZUSAMMENBAU
// ============================================================
module nabendeckel() {
    // Graviertes Logo abziehen, erhabenes Logo hinzufügen
    union() {
        difference() {
            union() {
                face_plate();
                clips();
                rim_ring();
            }
            // graviert
            if (logo_mode != "none" && logo_height < 0) logo_3d();
        }
        // erhaben
        if (logo_mode != "none" && logo_height > 0) logo_3d();
    }
}

nabendeckel();
